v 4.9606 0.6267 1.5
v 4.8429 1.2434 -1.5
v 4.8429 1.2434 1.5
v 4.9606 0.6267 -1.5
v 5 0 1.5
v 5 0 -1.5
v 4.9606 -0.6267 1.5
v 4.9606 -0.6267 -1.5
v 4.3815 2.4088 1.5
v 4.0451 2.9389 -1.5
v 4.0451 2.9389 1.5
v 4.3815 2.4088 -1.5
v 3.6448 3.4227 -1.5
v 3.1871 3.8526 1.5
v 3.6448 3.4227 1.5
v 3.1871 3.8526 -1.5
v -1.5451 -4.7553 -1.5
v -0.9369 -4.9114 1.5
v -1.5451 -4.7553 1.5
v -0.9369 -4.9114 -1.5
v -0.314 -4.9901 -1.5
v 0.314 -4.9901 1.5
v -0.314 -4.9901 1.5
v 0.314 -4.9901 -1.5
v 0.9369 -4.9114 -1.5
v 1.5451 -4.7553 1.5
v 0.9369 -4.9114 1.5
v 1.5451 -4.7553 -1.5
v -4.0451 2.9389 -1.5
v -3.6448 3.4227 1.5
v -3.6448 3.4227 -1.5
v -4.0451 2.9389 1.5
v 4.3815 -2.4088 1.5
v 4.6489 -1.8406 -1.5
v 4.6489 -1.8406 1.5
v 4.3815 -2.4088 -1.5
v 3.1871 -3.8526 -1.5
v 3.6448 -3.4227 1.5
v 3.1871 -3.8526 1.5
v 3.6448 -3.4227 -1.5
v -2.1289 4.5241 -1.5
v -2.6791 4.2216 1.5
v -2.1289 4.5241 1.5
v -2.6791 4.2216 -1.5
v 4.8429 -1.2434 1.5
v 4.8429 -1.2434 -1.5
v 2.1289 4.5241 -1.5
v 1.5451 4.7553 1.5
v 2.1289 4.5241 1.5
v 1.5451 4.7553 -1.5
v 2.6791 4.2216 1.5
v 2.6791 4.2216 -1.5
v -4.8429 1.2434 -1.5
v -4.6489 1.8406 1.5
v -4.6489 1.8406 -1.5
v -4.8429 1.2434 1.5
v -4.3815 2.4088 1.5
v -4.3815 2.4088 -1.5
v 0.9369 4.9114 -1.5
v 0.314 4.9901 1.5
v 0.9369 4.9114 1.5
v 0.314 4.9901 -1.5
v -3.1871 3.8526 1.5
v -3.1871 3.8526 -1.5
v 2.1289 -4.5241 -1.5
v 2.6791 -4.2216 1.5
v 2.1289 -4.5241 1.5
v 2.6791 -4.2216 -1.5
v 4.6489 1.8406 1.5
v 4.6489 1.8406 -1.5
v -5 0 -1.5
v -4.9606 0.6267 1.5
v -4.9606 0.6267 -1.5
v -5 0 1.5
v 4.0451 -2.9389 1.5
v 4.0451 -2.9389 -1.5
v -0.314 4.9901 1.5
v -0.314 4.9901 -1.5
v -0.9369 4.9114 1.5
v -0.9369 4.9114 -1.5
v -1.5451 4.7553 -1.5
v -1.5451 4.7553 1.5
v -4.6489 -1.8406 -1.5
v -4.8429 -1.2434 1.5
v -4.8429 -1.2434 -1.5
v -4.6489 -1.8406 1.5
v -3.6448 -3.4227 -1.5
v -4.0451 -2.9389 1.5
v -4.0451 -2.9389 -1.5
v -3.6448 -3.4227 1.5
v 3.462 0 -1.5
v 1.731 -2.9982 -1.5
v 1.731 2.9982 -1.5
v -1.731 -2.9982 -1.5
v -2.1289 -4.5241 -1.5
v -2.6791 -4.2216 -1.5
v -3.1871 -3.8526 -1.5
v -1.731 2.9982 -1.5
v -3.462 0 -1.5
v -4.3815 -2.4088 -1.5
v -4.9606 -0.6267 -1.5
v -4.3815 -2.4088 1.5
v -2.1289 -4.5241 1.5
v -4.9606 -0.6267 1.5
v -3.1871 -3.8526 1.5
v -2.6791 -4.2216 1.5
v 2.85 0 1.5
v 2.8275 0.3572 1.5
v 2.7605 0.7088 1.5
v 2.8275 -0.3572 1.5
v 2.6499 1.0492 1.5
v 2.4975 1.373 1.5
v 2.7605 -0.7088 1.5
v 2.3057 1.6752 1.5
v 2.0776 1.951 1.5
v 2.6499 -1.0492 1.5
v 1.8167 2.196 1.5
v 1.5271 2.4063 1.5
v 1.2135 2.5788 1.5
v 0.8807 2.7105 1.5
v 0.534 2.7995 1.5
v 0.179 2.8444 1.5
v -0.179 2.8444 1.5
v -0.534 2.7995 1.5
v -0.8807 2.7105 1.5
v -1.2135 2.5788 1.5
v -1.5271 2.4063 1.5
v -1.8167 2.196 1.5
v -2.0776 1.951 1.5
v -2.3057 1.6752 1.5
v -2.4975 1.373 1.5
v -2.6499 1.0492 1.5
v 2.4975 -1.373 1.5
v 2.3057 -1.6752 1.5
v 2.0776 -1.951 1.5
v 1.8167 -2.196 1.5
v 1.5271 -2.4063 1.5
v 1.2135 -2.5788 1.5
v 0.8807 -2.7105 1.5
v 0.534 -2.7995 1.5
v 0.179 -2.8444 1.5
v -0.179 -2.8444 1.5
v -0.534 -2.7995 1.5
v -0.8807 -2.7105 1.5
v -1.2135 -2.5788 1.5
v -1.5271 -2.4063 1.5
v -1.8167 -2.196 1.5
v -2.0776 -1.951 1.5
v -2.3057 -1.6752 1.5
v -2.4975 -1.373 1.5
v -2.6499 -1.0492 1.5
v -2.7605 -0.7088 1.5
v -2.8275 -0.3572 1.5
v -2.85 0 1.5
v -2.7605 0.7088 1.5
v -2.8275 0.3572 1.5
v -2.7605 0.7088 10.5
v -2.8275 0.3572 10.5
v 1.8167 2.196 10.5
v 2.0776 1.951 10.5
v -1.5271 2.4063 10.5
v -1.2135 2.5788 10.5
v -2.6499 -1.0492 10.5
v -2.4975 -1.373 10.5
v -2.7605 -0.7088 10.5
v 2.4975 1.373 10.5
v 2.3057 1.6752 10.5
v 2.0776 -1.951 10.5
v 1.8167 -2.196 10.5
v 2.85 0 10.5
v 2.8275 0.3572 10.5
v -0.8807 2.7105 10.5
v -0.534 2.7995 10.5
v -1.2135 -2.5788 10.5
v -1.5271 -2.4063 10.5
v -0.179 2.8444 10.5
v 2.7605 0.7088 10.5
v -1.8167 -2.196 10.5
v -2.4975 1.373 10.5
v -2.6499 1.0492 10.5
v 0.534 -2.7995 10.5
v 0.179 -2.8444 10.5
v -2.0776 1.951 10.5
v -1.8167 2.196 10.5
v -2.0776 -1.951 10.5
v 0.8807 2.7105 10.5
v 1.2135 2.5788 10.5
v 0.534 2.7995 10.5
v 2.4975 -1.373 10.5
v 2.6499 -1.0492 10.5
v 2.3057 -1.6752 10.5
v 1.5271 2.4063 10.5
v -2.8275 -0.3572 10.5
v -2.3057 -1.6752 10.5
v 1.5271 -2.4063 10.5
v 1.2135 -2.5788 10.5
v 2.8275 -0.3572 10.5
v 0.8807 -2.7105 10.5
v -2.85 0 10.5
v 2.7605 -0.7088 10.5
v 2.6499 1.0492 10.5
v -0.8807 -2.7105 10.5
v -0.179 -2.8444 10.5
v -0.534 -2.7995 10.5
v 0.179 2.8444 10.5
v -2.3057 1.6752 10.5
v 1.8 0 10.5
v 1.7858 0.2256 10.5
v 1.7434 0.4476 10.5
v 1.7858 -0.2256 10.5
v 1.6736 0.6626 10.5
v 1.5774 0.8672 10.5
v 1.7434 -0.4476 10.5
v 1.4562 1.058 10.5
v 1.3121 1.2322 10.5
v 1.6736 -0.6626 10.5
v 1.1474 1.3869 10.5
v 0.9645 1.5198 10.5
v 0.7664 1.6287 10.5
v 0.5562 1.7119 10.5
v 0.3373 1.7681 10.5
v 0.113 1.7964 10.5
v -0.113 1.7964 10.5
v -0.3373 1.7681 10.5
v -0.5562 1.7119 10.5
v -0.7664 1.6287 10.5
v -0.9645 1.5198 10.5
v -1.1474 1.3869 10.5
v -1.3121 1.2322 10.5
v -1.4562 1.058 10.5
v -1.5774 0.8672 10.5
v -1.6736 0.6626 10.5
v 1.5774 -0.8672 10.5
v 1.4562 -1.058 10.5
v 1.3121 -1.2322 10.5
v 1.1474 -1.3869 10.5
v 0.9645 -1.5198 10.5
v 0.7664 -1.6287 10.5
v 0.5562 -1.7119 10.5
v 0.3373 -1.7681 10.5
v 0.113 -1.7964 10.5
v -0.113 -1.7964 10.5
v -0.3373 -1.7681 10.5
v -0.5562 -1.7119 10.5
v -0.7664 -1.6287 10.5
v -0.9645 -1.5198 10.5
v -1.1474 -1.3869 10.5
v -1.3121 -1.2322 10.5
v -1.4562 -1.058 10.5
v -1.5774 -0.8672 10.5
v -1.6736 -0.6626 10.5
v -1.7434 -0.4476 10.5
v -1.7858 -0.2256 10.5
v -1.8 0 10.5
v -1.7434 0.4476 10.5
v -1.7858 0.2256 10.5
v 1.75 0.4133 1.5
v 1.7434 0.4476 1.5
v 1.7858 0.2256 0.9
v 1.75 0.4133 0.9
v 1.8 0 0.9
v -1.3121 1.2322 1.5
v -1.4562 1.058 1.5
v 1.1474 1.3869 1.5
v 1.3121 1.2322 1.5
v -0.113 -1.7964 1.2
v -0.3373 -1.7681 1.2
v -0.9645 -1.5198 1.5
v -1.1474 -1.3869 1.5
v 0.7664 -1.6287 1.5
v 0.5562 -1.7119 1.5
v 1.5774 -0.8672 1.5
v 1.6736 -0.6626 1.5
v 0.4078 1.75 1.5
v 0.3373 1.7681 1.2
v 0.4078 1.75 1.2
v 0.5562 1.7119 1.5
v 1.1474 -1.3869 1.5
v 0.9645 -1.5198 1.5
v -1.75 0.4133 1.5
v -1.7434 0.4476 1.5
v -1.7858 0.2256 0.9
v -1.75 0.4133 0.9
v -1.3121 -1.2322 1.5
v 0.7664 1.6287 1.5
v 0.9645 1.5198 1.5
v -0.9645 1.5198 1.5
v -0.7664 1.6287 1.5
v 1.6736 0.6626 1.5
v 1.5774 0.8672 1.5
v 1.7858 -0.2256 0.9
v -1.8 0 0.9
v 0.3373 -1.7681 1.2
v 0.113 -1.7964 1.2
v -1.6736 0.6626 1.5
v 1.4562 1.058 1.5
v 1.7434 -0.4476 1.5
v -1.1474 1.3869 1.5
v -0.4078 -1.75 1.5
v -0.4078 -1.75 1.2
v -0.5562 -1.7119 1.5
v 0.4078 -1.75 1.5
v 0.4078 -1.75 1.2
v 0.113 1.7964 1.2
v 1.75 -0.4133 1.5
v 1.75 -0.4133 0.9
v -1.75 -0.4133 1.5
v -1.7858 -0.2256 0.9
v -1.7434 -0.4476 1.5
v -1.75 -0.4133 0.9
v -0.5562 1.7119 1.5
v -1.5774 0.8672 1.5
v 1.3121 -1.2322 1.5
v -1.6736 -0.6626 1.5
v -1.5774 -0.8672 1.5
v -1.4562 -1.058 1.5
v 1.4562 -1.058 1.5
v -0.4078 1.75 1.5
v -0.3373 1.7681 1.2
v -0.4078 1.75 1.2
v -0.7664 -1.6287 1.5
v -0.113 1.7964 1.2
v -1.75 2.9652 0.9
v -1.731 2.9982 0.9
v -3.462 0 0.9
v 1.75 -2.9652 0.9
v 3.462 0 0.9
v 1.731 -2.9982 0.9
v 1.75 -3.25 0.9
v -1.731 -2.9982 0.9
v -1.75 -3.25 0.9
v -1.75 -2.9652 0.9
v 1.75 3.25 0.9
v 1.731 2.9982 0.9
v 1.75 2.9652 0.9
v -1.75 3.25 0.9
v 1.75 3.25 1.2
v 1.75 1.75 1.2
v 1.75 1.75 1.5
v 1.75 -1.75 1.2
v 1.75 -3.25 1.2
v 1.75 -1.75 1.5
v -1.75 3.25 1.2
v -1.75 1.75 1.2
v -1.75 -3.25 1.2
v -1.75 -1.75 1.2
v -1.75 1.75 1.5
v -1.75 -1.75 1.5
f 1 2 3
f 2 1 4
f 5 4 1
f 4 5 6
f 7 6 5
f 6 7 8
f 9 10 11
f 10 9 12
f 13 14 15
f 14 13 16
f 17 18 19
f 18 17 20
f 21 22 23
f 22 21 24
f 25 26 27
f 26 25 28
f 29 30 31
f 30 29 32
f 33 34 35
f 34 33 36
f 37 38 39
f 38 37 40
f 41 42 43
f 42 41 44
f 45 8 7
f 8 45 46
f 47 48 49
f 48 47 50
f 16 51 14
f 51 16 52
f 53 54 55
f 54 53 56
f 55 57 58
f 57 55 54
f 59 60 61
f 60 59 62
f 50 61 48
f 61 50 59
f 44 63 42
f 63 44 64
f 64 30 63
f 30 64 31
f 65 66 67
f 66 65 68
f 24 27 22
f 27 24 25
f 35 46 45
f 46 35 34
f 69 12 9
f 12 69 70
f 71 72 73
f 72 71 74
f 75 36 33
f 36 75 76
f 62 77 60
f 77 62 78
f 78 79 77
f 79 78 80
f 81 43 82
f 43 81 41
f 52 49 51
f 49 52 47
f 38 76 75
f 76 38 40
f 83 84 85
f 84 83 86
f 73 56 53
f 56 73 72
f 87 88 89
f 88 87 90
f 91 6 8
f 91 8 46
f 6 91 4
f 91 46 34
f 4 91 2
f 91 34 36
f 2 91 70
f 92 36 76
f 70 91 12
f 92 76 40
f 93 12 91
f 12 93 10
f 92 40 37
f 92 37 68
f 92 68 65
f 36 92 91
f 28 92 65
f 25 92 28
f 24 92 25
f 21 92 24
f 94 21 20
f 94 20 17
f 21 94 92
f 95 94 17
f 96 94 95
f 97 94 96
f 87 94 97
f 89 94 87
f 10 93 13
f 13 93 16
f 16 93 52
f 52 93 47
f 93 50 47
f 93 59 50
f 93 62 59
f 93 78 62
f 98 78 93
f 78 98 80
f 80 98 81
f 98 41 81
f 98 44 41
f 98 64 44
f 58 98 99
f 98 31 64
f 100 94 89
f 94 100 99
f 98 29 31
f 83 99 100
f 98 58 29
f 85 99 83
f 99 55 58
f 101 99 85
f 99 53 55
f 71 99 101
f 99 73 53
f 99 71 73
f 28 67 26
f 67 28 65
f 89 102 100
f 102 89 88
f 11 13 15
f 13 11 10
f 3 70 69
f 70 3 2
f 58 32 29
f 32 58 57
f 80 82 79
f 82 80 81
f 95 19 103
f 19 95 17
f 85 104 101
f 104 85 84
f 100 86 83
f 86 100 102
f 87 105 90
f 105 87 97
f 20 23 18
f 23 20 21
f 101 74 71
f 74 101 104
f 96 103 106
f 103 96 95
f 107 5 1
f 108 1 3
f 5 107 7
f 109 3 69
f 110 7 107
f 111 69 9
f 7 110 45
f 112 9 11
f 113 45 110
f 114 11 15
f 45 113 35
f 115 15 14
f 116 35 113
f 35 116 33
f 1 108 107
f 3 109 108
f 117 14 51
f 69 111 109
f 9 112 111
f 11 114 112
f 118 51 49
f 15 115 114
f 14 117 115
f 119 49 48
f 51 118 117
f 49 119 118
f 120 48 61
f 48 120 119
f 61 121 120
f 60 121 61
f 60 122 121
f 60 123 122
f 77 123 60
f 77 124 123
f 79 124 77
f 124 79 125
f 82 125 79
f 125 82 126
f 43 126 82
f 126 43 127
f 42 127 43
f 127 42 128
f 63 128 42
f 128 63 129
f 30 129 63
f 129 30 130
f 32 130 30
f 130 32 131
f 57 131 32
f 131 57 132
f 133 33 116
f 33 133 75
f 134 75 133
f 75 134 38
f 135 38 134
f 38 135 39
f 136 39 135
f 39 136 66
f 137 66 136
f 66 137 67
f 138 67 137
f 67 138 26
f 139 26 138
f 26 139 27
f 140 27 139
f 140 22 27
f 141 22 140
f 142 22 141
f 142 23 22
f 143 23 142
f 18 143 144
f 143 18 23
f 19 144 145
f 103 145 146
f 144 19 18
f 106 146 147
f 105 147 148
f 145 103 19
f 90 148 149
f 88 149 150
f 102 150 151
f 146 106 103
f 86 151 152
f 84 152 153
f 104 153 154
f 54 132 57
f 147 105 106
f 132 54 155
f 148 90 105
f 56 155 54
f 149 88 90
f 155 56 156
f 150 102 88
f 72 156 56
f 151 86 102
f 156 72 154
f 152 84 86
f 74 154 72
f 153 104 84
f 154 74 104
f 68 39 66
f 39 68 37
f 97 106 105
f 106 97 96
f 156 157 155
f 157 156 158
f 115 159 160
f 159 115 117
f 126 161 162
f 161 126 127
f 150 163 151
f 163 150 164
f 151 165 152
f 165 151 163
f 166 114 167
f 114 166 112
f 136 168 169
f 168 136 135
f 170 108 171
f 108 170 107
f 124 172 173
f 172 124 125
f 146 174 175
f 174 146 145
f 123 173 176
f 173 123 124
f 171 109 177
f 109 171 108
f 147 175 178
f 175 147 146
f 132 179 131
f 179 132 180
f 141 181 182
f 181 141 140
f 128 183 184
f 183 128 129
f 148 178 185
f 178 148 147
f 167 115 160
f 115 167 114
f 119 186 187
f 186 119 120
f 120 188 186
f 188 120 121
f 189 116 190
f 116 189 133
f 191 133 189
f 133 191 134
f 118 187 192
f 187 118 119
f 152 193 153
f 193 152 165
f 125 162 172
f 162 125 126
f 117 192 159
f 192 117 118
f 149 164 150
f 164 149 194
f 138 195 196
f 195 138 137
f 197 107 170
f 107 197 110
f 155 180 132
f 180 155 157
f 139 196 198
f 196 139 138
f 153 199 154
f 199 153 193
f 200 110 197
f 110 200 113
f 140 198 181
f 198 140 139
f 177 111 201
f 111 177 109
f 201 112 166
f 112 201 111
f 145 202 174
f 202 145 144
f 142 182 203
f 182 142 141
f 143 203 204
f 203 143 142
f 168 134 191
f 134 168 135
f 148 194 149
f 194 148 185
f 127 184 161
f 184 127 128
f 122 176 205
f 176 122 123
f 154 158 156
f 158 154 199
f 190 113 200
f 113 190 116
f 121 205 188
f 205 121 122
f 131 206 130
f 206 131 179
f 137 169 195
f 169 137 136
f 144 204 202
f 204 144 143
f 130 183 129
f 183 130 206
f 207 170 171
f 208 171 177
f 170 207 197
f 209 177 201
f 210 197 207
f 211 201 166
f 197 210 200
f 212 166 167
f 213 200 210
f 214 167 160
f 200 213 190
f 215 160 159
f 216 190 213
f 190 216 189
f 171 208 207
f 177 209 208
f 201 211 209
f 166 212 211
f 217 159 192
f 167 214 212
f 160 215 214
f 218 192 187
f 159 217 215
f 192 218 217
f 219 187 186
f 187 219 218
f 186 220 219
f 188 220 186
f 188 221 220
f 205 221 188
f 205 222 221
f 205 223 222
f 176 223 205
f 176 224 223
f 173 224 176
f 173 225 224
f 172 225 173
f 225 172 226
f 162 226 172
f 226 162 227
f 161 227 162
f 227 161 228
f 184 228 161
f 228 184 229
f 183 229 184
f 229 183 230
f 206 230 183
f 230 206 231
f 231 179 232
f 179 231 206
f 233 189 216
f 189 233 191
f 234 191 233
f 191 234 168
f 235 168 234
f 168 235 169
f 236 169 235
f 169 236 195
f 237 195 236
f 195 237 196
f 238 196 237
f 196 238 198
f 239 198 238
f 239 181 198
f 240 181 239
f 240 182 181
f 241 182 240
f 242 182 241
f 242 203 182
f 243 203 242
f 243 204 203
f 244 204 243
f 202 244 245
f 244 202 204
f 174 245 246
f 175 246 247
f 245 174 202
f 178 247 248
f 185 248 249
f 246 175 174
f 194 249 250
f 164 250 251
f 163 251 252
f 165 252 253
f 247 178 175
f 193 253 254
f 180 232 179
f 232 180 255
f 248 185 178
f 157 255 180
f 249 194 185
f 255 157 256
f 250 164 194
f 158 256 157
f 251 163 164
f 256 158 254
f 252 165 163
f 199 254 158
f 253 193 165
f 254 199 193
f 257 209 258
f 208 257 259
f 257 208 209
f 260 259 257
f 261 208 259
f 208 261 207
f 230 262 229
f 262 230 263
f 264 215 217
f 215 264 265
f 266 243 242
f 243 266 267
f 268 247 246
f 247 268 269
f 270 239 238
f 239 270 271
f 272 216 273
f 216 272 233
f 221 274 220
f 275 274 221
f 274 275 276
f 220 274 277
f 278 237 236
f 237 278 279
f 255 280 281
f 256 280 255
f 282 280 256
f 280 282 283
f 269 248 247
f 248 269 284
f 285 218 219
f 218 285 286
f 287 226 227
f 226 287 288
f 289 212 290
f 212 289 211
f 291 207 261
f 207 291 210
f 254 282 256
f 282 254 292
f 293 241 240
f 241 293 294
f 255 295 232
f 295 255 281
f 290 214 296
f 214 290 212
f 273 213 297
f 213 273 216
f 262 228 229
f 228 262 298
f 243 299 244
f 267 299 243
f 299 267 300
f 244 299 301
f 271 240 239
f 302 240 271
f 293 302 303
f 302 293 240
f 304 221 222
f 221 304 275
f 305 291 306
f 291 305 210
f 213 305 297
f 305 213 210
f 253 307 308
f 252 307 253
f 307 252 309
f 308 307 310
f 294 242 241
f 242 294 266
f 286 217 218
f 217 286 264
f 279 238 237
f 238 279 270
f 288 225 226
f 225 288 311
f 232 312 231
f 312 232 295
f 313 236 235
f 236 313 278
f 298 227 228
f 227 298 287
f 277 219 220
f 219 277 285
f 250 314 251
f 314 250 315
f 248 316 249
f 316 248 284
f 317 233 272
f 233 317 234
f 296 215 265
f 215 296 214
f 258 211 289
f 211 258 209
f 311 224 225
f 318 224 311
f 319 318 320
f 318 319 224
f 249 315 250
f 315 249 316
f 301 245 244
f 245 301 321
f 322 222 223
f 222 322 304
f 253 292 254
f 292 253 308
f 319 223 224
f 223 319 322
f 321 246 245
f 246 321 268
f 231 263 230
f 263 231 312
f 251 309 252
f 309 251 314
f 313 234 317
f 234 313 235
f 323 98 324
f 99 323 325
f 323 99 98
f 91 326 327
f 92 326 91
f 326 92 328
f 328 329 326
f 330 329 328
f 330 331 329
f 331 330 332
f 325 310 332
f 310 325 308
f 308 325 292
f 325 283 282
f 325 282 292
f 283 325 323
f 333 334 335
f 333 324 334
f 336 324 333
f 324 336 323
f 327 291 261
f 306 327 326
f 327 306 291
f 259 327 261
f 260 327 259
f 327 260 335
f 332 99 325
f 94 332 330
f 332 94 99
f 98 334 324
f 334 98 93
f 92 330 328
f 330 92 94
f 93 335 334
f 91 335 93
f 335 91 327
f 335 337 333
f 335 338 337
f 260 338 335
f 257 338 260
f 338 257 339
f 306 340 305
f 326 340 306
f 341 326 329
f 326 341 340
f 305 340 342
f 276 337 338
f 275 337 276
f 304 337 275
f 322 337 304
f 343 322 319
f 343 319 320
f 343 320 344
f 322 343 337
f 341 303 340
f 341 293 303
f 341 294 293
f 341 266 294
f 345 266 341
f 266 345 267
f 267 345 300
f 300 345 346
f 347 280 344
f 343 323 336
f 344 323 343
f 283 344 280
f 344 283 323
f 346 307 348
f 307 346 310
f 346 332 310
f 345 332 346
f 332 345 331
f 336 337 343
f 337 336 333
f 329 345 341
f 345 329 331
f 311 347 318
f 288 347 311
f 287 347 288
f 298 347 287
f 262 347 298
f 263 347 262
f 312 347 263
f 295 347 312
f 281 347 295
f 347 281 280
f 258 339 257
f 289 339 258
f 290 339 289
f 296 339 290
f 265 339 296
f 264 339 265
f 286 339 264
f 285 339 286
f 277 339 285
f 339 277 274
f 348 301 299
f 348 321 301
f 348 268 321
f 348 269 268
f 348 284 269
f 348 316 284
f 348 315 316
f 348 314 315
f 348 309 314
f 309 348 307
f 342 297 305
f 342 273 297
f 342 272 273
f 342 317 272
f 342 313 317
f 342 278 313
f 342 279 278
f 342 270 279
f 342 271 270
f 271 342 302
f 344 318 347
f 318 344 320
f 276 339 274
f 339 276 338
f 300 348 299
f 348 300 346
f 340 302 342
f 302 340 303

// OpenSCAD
$fn = 50;


difference() {
	union() {
		translate(v = [0, 0, -1.5000000000]) {
			rotate(a = [0, 0, 0]) {
				cylinder(h = 3, r = 5.0000000000);
			}
		}
		translate(v = [0, 0, -1.5000000000]) {
			rotate(a = [0, 0, 0]) {
				cylinder(h = 12, r = 2.8500000000);
			}
		}
	}
	union() {
		translate(v = [0, 0, -125.0000000000]) {
			rotate(a = [0, 0, 0]) {
				cylinder(h = 250, r = 1.8000000000);
			}
		}
		translate(v = [0, 0, -2.1000000000]) {
			rotate(a = [0, 0, 0]) {
				#translate(v = [0, 0, 0]) {
					rotate(a = [0, 0, 0]) {
						linear_extrude(height = 3) {
							polygon(points = [[3.4620000000, 0.0000000000], [1.7310000000, 2.9981799479], [-1.7310000000, 2.9981799479], [-3.4620000000, 0.0000000000], [-1.7310000000, -2.9981799479], [1.7310000000, -2.9981799479]]);
						}
					}
				}
			}
		}
		#translate(v = [-1.7500000000, -3.2500000000, 0.9000000000]) {
			rotate(a = [0, 0, 0]) {
				cube(size = [3.5000000000, 6.5000000000, 0.3000000000]);
			}
		}
		#translate(v = [-1.7500000000, -1.7500000000, 1.2000000000]) {
			rotate(a = [0, 0, 0]) {
				cube(size = [3.5000000000, 3.5000000000, 0.3000000000]);
			}
		}
		#translate(v = [-1.7500000000, -3.2500000000, -2.4000000000]) {
			rotate(a = [0, 0, 0]) {
				cube(size = [3.5000000000, 6.5000000000, 0.3000000000]);
			}
		}
		#translate(v = [-1.7500000000, -1.7500000000, -2.7000000000]) {
			rotate(a = [0, 0, 0]) {
				cube(size = [3.5000000000, 3.5000000000, 0.3000000000]);
			}
		}
	}
}
